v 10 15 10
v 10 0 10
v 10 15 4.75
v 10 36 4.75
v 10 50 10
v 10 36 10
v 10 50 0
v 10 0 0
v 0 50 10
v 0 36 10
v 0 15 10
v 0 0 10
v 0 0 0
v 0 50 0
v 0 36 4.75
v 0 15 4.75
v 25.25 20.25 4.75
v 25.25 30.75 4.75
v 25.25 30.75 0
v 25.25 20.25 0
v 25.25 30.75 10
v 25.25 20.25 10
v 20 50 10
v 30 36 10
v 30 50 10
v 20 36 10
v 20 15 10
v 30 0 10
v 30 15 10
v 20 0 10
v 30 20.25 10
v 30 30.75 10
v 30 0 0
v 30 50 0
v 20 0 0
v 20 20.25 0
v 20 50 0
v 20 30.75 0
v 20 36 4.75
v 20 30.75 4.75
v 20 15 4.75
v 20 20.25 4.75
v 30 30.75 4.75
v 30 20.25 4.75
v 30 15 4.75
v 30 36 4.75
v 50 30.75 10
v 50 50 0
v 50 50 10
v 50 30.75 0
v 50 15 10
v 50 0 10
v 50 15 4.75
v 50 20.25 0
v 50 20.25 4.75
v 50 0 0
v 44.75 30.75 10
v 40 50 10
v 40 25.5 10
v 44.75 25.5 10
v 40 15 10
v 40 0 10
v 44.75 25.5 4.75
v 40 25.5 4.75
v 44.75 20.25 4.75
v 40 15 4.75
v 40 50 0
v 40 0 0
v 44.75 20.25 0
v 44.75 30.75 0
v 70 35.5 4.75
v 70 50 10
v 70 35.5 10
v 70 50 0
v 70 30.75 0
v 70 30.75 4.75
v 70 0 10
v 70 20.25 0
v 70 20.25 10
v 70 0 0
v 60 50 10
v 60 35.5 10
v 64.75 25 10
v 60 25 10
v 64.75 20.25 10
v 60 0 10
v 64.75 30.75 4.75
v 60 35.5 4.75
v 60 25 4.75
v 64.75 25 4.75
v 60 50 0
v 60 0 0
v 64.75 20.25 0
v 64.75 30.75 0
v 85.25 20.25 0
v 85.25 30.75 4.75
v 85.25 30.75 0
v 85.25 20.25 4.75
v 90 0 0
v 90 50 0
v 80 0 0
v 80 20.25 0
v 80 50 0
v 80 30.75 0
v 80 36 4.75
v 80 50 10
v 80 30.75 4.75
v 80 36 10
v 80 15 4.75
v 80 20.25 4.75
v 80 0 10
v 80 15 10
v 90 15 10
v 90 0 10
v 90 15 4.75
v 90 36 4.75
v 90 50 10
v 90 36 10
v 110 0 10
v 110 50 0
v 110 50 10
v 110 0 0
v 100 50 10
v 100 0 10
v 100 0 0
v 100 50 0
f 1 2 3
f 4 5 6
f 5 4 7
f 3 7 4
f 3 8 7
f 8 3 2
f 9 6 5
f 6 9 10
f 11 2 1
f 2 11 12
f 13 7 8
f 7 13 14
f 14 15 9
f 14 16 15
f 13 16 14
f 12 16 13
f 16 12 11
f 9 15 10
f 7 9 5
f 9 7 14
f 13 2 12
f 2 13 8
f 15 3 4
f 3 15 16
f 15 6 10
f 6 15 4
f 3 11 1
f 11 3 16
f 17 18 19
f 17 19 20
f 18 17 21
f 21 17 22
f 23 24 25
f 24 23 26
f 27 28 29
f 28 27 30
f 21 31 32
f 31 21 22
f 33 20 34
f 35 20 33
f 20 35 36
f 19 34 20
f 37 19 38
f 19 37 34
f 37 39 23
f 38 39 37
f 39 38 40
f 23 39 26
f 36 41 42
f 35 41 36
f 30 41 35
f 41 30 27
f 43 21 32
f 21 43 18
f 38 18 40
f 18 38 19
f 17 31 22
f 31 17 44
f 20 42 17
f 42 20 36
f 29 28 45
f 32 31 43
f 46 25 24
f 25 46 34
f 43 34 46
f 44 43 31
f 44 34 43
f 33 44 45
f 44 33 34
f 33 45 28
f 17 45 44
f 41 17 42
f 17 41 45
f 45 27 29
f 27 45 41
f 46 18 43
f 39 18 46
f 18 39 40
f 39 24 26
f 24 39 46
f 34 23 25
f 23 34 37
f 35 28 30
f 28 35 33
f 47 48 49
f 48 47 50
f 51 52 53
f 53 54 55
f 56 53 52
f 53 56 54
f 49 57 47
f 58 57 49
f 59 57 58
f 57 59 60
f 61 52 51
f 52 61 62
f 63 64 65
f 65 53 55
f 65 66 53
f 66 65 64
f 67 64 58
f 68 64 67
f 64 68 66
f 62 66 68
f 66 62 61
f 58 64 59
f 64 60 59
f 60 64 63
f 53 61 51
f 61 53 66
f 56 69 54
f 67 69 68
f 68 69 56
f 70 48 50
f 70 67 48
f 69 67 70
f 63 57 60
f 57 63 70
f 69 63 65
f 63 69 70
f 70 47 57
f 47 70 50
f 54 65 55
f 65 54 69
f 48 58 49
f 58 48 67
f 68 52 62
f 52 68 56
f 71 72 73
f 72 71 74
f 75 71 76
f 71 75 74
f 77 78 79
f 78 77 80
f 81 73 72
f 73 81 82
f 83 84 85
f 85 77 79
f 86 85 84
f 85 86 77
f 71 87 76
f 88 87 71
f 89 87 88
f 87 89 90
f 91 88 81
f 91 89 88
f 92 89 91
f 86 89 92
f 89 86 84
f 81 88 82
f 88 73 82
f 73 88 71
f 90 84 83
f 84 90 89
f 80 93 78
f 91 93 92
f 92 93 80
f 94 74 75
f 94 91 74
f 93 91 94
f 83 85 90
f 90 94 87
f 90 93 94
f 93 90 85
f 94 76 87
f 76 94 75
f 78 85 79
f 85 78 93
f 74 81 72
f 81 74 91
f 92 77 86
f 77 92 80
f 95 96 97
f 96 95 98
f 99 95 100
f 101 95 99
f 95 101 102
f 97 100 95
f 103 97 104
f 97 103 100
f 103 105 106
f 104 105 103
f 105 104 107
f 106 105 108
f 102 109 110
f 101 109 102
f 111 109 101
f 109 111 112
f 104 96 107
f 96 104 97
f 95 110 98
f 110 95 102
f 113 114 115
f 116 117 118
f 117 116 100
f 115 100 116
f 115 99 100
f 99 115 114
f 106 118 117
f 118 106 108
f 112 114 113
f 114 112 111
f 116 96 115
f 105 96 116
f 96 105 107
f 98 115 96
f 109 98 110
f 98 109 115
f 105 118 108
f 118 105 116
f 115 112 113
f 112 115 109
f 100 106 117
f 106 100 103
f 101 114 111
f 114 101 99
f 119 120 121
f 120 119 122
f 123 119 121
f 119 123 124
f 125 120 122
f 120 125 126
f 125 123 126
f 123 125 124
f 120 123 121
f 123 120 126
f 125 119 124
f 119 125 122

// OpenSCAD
//大小比例控制
Scale=1;
//长度
Height=Scale*50;
//宽度
Width=Scale*10;
//角度
Angle=0;
//偏差
Deviation=0.5;
//根据id自动返回切割位置 参数:id,缩放级别,方条宽度
function cutoffice(id,scale,cubewidth,cubeheight)=cubewidth*1.5;
/* 把上面的结尾改成这个,可以修改每个部件的切割位置
=
	(id==0)?((cubeheight-(cubewidth*2))/2):
	(id==1)?(cubewidth*1.5):
	(id==2)?0:
	(id==3)?0:
	(id==4)?0:
	(id==5)?0:0;
	// */	

//https://jingyan.baidu.com/article/7908e85c9c8227af481ad2a7.html
//根据id自动返回剪切器 参数:id,缩放级别,方条宽度,误差
module cutter(id,scale,cubewidth,deviation)
{
	//全宽
	width=cubewidth;
	//加误差全宽
	adwidth=width+deviation;
	//减误差全宽
	sdwidth=width-deviation;
	//半宽
	hwidth=width/2;
	//加误差半宽
	adhwidth=adwidth/2;
	//减误差半宽
	sdhwidth=sdwidth/2;
	//2
	if(id==0)translate([0,0,sdhwidth])	cube([width,adwidth*2,adhwidth]);
	//5
	if(id==1)union()	{
		translate([0,adhwidth,0])cube([adhwidth,adwidth,width]);
		translate([0,0,sdhwidth]) cube([width,adhwidth,adhwidth]);
		translate([0,adwidth*1.5,sdhwidth]) cube([width,adhwidth,adhwidth]);
	};
	//1
	if(id==2)union()	{
		translate([0,0,sdhwidth])	cube([cubewidth,adwidth,adhwidth]);
		translate([sdhwidth,adhwidth,0])	cube([adhwidth,adwidth,width]);
	};
	//3
	if(id==3)	union()	{
		translate([0,width,sdhwidth])cube([width,adwidth,adhwidth]);
		translate([sdhwidth,adhwidth,0])cube([adhwidth,adwidth,width]);
	};
	//4
	if(id==4)	union()	{
		translate([0,adhwidth,0])cube([adhwidth,adwidth,adhwidth]);
		translate([0,0,sdhwidth])cube([width,adwidth*2,adhwidth]);
	};
}
//调试剪切器
//translate([0,0,20])cutter(1,Scale,Width,1);

for(i=[0:5])
{
	translate([(Width+10)*i,0,0])rotate([0,Angle,0]) 	difference() {
		cube([Width,Height,Width]);
		translate([0,cutoffice(i,Scale,Width,Height),0]) cutter(i,Scale,Width,Deviation);
	}
}

/* 另一个版本的6根锁,有空再研究
//根据id自动返回剪切器 参数:id,缩放级别,方条宽度
module cutter(id,scale,cubewidth)
{
	if(id==0)	translate([0,0,Width/2])	{
		cube([cubewidth,cubewidth,cubewidth/2]);
		translate([0,cubewidth*1.5,0]) cube([cubewidth,cubewidth/2,cubewidth/2]);
	};
	if(id==1)	union()	{
		cube([cubewidth/2,cubewidth*1.5,cubewidth]);
		translate([0,cubewidth/2,cubewidth/2]) cube([cubewidth,cubewidth,cubewidth/2]);
	};
		if(id==2)translate([0,0,cubewidth/2])	cube([cubewidth,cubewidth,cubewidth/2]);
	if(id==3)	union()	{
		cube([cubewidth/2,cubewidth*2,cubewidth]);
		translate([0,cubewidth/2,cubewidth/2]) cube([cubewidth,cubewidth,cubewidth/2]);
	};
}
// */
